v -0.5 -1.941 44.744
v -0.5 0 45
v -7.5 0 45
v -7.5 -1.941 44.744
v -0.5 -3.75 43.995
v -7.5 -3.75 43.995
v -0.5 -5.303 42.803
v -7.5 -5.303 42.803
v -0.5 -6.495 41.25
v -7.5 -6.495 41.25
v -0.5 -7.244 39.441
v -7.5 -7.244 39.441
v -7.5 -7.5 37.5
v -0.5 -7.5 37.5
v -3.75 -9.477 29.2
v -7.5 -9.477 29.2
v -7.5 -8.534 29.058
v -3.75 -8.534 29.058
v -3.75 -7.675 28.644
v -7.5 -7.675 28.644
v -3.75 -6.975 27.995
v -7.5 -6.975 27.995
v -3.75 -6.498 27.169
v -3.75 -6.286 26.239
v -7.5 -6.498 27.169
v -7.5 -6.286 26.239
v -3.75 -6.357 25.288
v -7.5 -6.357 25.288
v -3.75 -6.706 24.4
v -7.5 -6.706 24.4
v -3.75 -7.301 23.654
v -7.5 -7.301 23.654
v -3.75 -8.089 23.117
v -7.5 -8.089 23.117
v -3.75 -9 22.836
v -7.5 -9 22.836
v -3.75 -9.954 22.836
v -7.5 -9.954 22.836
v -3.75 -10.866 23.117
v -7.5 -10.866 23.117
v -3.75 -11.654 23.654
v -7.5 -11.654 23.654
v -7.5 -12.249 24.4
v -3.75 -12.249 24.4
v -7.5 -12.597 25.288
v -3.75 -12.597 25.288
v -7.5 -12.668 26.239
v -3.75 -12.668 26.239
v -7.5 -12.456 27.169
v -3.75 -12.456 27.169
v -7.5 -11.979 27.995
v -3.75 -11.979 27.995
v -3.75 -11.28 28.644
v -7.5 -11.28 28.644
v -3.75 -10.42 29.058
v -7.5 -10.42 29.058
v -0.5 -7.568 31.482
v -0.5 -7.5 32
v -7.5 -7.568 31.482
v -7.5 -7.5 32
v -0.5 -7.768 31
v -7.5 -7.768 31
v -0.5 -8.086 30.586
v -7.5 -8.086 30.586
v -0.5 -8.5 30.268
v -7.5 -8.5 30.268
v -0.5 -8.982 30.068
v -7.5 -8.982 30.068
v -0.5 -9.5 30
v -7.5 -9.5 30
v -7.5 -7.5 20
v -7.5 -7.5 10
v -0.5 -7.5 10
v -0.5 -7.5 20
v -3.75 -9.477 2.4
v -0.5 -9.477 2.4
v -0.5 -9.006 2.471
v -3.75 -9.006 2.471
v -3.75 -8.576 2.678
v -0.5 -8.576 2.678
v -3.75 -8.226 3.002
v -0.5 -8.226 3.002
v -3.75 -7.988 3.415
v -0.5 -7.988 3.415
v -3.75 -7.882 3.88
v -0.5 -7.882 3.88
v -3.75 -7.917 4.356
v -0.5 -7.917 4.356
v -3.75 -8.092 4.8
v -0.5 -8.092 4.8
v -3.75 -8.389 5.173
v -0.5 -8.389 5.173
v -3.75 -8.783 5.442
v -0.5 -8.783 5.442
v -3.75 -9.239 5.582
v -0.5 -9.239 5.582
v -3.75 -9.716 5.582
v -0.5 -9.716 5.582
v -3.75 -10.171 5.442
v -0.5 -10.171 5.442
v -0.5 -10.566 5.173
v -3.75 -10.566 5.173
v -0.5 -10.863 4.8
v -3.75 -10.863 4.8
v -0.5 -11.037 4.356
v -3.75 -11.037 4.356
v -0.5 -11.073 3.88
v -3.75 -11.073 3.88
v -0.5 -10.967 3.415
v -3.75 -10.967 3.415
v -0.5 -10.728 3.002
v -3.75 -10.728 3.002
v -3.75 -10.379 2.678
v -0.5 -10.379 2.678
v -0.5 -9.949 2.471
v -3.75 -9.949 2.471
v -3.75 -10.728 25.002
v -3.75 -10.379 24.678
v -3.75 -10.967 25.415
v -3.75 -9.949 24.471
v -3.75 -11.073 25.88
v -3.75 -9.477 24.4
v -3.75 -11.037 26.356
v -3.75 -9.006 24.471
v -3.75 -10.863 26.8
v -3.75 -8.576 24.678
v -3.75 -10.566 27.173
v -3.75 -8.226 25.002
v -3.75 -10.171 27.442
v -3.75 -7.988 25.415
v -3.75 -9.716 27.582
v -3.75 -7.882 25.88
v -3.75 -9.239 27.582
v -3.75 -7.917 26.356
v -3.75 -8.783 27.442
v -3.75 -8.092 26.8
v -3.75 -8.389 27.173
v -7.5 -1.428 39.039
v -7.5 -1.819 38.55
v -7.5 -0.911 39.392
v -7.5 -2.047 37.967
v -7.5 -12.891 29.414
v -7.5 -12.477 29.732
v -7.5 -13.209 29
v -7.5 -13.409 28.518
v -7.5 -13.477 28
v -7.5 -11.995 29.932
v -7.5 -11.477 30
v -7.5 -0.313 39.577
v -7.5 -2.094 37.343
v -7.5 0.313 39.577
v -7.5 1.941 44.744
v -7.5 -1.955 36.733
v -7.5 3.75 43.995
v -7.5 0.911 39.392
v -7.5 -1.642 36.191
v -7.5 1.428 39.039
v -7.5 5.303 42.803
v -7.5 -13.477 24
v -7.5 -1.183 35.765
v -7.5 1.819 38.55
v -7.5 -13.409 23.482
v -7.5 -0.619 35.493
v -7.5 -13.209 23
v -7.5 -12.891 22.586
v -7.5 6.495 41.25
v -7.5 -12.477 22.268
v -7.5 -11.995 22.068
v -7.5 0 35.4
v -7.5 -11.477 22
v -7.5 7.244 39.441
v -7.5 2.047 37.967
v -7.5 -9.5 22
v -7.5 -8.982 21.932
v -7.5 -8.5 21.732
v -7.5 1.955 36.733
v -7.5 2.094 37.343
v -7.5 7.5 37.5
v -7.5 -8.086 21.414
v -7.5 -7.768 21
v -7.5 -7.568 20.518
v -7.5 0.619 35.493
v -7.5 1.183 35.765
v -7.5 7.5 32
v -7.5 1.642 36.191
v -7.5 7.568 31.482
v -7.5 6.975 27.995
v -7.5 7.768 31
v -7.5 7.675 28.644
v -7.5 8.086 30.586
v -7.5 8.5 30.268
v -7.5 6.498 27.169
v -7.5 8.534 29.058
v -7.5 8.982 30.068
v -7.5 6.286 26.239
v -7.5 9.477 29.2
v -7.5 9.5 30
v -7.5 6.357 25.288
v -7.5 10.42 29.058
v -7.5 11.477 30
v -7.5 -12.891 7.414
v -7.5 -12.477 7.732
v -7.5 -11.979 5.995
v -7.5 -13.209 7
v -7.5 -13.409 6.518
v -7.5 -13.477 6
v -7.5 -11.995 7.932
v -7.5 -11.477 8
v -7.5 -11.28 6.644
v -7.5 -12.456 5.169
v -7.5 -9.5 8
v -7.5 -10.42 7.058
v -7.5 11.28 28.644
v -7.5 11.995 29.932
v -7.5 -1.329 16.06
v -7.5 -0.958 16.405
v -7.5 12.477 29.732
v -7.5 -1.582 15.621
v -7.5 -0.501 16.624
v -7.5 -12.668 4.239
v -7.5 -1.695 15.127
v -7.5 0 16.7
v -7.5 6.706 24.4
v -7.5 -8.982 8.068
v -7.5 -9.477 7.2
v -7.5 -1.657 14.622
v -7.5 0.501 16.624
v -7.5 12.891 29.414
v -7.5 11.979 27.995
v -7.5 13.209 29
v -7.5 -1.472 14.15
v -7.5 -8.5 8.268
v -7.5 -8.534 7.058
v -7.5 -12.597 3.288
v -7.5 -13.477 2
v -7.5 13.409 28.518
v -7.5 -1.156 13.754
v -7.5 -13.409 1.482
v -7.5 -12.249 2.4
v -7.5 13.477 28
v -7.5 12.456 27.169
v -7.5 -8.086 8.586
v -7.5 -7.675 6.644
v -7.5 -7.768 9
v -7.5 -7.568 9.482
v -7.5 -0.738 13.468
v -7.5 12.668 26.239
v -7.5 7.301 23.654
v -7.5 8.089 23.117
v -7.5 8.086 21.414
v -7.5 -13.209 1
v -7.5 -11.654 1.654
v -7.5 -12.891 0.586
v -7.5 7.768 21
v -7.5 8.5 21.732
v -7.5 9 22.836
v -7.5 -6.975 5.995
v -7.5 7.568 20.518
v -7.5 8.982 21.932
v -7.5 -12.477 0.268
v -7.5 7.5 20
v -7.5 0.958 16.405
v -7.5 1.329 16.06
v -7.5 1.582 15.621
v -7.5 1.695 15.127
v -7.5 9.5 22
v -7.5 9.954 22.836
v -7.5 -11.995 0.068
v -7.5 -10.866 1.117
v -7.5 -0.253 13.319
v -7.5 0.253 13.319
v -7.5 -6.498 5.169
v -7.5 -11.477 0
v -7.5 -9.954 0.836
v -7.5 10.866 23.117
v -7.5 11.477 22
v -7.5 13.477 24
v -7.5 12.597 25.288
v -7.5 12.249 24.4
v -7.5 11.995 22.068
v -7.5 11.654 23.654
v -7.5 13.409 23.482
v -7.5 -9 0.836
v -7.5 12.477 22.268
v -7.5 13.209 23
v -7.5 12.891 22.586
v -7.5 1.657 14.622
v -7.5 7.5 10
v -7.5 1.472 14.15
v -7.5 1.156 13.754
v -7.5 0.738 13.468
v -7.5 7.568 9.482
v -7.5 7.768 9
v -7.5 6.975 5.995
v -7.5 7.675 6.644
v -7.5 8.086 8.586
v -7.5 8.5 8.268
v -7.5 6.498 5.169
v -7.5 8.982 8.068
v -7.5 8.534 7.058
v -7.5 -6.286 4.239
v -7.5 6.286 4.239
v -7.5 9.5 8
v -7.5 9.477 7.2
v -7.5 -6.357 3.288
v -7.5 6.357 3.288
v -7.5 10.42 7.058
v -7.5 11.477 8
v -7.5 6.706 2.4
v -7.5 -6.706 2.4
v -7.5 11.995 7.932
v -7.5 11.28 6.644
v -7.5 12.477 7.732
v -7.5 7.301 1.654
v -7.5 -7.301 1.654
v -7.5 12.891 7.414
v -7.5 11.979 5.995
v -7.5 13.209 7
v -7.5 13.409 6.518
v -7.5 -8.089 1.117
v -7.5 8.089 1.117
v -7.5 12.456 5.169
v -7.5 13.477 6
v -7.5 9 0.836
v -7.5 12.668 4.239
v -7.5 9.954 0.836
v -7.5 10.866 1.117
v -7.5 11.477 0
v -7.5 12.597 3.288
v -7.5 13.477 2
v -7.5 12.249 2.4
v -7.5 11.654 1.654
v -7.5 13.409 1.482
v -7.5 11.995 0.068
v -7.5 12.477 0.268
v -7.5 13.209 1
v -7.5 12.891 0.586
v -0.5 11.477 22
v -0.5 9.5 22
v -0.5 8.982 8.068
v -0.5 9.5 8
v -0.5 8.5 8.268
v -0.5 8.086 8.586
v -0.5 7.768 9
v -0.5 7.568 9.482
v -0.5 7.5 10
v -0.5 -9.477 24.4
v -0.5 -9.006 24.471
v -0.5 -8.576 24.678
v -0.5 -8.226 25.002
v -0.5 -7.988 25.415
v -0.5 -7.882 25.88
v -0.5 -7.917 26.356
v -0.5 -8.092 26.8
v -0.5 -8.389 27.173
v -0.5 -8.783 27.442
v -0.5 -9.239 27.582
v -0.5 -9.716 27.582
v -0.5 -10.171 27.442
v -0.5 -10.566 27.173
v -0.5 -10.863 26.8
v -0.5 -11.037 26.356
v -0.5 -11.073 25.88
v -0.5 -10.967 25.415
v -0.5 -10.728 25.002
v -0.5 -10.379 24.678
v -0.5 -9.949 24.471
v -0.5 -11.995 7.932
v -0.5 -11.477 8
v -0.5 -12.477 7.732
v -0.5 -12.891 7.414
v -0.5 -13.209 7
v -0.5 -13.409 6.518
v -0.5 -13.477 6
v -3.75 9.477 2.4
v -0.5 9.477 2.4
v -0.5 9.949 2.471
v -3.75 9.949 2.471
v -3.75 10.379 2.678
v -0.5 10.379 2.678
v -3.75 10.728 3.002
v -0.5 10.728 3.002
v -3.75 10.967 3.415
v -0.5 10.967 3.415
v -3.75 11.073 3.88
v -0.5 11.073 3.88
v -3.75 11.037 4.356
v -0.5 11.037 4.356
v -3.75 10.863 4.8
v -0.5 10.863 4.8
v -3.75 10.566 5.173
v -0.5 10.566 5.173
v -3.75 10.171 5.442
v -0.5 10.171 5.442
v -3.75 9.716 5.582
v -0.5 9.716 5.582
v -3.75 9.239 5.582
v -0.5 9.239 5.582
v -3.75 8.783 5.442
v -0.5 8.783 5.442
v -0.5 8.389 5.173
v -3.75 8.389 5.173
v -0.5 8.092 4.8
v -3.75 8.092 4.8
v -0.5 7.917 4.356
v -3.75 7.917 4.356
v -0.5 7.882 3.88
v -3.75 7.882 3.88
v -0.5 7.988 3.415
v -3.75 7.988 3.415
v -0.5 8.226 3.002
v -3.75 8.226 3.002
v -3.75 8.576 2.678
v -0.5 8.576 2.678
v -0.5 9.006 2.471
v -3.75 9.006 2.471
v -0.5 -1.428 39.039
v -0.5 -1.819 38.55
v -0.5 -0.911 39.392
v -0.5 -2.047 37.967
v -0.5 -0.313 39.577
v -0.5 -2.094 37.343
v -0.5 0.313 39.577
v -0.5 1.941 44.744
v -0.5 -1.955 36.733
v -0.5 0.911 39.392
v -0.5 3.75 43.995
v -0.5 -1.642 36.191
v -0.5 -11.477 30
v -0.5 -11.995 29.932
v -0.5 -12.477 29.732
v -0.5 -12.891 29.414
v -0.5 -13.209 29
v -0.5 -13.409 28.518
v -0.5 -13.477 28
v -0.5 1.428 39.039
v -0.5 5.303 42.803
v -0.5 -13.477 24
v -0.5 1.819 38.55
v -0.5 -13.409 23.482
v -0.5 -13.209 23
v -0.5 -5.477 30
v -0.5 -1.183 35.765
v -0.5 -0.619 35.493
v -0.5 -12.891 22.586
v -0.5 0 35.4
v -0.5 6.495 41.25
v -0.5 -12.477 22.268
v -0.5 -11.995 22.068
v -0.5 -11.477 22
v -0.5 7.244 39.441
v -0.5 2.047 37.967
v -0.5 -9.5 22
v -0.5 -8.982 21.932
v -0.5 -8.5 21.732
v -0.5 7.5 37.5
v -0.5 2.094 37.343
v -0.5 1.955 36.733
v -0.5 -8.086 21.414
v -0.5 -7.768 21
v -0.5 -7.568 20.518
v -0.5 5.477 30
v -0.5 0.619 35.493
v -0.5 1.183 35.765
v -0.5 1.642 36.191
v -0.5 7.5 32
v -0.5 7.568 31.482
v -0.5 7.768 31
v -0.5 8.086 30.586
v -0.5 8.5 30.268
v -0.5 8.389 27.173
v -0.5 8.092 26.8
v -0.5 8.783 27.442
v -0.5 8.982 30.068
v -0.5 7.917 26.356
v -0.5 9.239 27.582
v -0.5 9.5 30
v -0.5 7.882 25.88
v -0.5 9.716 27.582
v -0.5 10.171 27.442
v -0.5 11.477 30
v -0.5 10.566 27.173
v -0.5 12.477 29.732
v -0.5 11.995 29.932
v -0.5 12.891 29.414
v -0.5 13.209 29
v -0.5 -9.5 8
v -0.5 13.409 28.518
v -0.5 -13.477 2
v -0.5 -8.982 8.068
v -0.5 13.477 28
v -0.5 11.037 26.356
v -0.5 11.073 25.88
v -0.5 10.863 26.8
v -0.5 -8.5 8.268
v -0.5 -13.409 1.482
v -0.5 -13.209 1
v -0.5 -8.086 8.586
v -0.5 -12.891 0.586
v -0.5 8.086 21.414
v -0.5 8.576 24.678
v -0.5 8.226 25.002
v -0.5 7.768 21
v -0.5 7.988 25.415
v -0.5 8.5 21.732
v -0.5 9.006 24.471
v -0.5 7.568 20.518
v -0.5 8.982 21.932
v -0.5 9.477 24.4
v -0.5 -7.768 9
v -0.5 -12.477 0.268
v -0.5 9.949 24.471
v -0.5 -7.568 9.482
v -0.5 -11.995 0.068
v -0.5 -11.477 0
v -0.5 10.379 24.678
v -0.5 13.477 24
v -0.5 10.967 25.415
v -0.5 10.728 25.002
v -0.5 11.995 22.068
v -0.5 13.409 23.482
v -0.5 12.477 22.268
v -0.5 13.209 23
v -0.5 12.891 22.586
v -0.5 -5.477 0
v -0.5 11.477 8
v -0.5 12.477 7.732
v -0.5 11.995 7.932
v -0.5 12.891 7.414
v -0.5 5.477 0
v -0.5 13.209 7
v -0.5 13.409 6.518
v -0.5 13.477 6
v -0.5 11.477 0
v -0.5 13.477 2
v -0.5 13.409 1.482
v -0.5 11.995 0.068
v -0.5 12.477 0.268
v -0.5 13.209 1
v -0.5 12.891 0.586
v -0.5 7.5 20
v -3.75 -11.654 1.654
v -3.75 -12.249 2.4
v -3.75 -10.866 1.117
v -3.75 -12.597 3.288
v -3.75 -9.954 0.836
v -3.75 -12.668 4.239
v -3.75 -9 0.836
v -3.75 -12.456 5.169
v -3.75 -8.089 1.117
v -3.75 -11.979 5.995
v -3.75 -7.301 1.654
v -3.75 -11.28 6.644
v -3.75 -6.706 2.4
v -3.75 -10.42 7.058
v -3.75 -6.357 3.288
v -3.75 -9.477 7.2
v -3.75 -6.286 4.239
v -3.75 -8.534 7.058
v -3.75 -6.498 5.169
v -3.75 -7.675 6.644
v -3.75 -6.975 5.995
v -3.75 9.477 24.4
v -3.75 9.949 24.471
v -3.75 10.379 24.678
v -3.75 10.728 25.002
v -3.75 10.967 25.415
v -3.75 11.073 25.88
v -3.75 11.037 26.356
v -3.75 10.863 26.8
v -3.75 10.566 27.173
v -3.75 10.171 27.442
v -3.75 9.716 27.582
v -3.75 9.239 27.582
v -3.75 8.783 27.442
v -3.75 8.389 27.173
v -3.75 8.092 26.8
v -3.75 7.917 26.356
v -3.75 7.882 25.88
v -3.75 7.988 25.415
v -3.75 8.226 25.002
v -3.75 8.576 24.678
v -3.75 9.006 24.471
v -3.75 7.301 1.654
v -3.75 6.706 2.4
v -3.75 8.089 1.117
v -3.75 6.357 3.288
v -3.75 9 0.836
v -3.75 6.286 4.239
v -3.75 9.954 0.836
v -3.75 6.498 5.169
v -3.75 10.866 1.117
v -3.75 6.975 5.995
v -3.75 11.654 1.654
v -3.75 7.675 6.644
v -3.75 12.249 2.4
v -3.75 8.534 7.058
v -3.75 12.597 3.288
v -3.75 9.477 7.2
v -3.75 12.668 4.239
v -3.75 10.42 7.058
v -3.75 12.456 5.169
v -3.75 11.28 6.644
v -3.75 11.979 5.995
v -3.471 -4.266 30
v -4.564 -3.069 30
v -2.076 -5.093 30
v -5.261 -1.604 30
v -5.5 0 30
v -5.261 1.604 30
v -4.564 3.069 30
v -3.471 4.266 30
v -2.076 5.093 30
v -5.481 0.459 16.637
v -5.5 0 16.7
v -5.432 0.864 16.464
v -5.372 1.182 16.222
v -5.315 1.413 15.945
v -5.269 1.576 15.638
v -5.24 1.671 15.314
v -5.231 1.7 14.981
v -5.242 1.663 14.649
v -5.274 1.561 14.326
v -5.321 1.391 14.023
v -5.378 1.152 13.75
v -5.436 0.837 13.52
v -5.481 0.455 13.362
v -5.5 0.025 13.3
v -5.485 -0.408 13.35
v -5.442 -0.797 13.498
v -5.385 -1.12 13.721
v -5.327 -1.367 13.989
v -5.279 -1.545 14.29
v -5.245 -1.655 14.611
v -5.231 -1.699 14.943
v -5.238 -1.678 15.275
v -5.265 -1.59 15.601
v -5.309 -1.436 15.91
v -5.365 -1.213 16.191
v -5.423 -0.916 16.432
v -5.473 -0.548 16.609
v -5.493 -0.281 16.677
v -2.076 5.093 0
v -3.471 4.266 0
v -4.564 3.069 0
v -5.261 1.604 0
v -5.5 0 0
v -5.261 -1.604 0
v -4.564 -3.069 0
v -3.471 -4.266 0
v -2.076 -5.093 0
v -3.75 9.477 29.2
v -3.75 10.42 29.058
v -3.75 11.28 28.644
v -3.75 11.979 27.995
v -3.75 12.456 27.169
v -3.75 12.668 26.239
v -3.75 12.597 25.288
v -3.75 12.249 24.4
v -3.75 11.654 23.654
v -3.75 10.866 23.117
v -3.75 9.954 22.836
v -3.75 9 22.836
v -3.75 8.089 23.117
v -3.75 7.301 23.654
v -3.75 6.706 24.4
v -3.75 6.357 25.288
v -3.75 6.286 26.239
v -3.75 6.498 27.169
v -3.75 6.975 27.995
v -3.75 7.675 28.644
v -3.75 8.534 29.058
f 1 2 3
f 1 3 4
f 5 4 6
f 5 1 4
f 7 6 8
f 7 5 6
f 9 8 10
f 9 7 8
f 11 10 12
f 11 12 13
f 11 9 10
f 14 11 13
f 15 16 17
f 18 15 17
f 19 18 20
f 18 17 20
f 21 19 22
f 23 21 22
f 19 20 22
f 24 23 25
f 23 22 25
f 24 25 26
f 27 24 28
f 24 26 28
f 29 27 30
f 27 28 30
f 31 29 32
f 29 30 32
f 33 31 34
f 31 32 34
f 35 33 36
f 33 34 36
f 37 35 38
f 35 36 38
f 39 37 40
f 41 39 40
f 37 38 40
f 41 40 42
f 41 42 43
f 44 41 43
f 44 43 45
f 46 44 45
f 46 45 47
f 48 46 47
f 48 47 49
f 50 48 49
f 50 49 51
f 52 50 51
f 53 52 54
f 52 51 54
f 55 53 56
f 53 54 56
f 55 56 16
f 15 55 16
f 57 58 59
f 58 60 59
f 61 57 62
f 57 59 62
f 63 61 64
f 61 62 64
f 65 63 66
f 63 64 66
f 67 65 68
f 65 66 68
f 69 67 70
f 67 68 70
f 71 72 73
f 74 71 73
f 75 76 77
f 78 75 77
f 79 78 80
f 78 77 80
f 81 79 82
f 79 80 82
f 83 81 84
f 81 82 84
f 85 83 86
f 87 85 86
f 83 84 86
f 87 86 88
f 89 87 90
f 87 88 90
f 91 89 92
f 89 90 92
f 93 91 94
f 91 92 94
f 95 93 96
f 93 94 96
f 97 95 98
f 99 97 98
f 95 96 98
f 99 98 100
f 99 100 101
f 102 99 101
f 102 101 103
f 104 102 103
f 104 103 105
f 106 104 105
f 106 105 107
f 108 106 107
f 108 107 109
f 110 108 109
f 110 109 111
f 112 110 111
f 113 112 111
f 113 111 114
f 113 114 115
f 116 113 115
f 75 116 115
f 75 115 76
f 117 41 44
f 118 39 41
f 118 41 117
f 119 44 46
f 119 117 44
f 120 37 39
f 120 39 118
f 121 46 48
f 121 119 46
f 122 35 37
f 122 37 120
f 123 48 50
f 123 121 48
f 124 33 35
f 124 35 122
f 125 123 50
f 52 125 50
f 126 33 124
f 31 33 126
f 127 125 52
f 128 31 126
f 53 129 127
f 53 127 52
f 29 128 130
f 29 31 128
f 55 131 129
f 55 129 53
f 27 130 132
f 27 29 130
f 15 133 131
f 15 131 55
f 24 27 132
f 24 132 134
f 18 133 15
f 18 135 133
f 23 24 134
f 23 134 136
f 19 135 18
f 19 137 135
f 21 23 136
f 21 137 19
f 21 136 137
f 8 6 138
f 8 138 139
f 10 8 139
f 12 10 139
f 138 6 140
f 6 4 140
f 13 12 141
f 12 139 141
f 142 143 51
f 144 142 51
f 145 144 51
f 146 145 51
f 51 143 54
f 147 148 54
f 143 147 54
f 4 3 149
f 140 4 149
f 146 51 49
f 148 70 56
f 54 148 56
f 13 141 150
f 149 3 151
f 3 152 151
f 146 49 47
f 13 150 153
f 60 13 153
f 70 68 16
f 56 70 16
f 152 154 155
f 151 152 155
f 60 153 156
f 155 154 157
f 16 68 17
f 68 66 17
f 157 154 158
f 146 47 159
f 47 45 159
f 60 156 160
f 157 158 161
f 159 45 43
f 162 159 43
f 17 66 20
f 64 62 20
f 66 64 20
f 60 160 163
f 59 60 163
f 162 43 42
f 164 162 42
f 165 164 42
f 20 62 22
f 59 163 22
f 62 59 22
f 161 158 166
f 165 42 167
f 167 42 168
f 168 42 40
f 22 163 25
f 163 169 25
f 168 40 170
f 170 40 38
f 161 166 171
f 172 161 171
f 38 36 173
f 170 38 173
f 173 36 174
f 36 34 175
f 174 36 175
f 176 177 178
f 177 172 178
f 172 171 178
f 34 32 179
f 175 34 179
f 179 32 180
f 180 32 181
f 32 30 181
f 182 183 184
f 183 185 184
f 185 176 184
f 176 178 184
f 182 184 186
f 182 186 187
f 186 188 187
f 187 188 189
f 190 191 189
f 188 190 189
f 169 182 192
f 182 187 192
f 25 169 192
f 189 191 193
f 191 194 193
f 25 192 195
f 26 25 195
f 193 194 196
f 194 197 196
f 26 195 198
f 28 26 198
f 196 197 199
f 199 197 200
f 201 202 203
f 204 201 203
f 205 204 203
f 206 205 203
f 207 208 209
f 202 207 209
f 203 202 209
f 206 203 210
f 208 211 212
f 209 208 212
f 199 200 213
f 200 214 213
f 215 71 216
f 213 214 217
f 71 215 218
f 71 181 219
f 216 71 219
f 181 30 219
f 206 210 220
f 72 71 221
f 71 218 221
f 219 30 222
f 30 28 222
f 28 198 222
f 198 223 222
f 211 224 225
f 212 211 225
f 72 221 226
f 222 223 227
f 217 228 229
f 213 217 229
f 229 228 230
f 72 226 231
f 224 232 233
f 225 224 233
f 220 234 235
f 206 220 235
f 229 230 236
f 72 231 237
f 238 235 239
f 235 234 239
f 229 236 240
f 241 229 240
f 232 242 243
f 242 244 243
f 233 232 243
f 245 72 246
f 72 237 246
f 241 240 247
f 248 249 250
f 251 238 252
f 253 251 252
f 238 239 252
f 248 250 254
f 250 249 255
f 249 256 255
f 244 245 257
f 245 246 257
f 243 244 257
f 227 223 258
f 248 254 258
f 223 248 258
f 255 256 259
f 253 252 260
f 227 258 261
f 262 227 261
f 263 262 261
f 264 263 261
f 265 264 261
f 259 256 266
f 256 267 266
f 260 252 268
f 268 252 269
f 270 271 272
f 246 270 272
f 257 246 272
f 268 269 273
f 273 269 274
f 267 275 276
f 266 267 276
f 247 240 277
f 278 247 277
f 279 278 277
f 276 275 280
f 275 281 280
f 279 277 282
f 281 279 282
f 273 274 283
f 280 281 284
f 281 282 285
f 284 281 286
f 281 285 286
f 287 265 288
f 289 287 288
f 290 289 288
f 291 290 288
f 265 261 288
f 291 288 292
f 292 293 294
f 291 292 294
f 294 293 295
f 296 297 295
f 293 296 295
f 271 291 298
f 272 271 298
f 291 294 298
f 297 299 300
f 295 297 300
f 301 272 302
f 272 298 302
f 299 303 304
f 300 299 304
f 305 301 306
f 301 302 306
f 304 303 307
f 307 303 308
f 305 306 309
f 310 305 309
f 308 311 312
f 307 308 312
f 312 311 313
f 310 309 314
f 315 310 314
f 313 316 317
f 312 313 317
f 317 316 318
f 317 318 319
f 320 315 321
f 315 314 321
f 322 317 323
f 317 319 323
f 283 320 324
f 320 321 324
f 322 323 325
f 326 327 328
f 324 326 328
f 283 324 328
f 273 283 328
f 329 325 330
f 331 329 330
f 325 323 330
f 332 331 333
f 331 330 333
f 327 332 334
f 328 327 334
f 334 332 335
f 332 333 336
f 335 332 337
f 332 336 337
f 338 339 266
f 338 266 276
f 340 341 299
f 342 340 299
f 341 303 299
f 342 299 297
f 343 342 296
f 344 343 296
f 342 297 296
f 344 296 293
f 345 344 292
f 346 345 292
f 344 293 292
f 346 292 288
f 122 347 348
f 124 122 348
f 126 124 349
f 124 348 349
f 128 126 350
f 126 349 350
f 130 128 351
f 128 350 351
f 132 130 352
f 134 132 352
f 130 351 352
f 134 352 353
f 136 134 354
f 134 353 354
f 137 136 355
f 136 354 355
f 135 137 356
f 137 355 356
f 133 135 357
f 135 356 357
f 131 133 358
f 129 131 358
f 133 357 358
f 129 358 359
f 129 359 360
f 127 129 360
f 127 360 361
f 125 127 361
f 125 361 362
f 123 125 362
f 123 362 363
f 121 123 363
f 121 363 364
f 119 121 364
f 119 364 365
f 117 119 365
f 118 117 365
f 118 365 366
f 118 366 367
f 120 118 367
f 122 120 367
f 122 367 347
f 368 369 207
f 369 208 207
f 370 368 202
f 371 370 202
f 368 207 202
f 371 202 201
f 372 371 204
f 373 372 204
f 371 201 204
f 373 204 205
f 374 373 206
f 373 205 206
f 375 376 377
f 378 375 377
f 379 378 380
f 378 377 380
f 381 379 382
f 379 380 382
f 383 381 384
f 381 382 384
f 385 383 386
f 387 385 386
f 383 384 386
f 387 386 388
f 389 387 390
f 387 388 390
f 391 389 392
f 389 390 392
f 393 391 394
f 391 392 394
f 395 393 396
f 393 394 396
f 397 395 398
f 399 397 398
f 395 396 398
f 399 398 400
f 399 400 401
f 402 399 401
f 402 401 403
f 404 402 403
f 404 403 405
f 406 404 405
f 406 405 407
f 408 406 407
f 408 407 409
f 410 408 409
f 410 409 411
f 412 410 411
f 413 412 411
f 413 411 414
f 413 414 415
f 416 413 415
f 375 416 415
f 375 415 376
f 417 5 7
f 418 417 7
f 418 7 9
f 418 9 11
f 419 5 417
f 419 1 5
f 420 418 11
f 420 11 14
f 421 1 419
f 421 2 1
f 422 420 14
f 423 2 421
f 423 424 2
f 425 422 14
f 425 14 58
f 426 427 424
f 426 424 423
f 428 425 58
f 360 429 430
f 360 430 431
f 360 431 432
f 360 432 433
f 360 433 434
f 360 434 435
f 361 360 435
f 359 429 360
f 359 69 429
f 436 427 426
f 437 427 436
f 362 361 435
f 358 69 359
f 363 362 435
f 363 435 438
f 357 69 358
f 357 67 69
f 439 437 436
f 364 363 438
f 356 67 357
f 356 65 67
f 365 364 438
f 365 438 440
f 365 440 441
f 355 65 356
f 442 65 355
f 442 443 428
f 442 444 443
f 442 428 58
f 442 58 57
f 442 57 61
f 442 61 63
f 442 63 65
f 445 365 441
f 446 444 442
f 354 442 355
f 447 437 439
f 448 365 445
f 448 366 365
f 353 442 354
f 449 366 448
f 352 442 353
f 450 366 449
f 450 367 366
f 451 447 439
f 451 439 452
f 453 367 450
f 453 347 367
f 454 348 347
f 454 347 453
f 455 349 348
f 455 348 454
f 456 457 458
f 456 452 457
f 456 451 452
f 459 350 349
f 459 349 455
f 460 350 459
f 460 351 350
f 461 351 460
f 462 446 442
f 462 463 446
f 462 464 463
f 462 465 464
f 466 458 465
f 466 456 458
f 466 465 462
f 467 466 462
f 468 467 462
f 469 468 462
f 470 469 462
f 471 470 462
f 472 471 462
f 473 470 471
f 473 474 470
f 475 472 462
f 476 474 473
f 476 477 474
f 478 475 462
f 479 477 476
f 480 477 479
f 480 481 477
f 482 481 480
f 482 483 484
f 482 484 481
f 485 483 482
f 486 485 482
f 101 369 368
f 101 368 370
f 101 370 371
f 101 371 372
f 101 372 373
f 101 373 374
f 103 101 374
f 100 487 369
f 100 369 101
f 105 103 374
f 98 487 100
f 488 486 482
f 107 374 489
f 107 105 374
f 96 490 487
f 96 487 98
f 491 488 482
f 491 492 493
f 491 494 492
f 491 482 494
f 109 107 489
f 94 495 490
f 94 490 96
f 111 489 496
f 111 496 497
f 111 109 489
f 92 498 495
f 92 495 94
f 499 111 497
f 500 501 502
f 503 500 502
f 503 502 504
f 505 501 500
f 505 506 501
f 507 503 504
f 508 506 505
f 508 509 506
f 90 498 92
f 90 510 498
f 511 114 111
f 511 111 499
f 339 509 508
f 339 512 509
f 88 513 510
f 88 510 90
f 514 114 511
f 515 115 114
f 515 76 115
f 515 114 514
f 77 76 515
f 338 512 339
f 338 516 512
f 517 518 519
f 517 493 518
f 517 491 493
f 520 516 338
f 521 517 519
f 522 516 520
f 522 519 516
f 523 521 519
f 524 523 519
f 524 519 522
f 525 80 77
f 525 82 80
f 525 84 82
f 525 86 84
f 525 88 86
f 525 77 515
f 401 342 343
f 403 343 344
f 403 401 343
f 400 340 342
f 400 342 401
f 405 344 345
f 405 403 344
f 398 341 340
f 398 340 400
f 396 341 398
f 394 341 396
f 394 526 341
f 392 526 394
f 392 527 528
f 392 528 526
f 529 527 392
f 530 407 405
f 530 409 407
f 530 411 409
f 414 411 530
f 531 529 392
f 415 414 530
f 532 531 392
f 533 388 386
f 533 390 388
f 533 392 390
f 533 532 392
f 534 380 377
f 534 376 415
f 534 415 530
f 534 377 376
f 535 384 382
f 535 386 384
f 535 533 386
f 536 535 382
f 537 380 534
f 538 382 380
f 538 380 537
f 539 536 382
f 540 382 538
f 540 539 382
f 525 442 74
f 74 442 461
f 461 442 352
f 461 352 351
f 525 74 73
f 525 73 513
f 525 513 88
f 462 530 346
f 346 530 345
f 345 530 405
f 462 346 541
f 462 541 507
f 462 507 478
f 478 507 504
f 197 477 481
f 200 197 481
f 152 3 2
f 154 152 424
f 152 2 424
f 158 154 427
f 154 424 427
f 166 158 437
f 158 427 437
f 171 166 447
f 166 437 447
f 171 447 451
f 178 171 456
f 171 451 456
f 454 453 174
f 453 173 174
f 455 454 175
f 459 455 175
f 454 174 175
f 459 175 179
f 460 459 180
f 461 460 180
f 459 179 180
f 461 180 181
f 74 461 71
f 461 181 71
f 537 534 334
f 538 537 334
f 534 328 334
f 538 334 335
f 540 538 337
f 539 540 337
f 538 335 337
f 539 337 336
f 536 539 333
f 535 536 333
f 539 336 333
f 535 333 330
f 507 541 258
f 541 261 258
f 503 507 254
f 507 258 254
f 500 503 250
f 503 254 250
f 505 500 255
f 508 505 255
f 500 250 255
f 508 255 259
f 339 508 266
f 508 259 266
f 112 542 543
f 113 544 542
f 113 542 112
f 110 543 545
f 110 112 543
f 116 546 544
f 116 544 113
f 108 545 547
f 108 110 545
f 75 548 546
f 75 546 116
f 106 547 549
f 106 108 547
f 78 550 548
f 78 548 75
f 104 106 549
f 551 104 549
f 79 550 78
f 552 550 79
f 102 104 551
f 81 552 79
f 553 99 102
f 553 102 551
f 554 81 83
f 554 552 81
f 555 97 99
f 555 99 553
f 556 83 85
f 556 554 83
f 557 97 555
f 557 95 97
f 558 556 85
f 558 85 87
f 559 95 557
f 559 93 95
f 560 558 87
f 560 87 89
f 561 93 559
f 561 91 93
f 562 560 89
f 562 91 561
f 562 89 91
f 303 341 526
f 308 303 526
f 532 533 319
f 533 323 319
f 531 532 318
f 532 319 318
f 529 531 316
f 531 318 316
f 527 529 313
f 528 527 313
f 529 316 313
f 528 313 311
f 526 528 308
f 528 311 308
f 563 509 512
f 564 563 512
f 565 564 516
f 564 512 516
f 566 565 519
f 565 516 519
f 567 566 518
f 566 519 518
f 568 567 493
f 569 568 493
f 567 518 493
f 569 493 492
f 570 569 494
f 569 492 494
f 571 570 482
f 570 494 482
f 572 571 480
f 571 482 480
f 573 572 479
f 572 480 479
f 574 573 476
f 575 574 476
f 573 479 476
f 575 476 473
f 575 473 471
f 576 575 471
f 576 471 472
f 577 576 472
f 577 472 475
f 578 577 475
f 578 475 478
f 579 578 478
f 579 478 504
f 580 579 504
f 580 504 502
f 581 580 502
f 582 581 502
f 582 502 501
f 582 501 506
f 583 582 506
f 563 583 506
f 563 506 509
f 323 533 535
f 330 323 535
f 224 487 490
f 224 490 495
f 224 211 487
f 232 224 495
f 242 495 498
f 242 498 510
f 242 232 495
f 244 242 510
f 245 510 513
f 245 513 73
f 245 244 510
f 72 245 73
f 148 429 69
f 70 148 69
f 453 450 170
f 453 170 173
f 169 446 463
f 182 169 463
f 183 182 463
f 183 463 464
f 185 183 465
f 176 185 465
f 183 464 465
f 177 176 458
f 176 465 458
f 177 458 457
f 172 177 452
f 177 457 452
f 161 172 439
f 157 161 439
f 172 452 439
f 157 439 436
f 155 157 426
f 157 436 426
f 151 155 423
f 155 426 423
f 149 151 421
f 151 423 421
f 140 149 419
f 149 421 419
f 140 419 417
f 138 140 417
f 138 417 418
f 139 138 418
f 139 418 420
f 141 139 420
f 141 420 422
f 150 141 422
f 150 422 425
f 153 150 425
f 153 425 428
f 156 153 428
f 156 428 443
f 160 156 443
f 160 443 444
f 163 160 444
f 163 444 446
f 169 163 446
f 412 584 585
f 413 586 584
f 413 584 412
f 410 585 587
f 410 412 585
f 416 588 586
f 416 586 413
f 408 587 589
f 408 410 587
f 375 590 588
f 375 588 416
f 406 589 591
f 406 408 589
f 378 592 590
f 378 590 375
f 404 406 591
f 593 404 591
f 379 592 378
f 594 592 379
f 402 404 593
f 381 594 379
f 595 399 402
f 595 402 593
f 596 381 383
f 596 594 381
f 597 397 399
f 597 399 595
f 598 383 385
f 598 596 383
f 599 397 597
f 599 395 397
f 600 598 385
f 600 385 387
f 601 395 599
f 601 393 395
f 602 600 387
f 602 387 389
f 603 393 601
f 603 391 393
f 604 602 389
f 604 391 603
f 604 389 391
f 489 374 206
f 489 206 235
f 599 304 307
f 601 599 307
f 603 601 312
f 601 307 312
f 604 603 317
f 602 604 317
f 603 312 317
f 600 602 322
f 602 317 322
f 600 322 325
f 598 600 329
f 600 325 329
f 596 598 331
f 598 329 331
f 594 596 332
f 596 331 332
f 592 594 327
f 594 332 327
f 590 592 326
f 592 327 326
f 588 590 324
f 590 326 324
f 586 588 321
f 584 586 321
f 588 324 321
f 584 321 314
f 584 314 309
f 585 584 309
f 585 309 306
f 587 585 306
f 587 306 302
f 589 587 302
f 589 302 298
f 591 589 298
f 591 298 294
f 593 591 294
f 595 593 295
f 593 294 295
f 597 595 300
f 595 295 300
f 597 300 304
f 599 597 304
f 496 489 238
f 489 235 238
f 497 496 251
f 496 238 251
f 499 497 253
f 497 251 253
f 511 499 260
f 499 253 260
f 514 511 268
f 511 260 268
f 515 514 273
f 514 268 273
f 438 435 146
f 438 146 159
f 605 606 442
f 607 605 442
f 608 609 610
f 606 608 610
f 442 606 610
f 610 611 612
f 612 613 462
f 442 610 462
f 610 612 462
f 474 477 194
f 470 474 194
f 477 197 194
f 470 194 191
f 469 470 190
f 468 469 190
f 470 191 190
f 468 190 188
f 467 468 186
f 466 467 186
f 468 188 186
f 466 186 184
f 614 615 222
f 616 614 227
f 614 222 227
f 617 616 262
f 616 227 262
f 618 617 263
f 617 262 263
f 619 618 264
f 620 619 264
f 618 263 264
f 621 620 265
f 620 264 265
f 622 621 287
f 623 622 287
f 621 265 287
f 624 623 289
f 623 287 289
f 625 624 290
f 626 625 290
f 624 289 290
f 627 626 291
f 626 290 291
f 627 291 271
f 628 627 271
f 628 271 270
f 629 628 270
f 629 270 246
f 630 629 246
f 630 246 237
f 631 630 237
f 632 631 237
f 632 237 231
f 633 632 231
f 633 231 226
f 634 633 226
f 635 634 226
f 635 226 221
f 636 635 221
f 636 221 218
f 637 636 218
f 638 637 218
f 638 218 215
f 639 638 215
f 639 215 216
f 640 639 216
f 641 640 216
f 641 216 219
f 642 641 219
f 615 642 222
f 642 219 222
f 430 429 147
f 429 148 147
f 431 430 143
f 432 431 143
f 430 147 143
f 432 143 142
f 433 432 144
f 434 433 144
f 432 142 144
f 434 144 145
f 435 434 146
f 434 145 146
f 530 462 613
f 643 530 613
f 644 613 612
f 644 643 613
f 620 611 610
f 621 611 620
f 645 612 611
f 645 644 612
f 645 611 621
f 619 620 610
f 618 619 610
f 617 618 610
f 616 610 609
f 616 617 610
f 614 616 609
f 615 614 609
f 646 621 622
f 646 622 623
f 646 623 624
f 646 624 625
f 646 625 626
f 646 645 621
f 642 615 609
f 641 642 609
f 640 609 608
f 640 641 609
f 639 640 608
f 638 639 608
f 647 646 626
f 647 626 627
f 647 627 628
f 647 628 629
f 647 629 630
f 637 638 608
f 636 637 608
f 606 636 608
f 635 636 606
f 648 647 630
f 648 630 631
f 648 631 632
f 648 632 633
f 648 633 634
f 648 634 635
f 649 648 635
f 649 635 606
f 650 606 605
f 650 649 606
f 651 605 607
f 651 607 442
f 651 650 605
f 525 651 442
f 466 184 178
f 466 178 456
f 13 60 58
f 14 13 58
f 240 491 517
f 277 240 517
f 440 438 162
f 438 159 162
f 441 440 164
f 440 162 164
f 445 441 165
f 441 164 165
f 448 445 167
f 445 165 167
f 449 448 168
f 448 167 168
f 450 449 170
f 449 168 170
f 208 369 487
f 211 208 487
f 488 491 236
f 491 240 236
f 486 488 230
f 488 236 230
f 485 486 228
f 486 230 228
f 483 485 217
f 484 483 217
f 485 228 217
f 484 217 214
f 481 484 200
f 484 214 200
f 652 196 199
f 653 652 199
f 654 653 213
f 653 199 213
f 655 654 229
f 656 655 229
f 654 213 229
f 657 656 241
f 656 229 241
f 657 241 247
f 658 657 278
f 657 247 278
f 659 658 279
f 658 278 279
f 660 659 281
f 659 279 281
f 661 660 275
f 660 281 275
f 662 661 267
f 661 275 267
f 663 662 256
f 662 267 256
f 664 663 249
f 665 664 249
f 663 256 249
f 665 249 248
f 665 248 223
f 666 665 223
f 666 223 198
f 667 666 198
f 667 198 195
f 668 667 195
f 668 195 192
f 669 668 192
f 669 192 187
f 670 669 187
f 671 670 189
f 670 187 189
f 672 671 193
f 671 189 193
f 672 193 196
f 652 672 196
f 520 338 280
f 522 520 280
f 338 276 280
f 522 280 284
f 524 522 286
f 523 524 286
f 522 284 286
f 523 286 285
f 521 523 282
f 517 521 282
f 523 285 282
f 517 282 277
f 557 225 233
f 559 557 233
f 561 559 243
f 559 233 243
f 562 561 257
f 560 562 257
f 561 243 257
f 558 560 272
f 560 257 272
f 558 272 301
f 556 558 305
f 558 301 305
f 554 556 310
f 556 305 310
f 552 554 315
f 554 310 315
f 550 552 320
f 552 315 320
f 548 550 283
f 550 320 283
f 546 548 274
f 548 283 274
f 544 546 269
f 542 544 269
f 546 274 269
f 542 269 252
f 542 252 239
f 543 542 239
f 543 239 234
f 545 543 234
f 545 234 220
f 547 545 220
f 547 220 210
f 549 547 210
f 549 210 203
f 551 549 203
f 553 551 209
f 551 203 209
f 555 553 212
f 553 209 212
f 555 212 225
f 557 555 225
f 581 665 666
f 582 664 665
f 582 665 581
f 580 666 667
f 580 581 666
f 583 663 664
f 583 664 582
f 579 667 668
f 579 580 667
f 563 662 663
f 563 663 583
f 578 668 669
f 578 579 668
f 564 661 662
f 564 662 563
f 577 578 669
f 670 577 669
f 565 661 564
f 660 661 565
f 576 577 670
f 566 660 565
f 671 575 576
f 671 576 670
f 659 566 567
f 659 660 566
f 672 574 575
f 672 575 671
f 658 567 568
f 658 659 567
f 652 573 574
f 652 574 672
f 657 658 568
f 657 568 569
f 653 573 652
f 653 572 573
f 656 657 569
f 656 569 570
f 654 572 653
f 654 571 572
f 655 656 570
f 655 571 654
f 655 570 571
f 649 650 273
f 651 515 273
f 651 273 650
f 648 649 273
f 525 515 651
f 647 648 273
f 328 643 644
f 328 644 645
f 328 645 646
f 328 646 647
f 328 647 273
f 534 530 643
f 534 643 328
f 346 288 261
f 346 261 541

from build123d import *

# Parameters (mm, degrees)
SKETCH_1_W          = 15
SKETCH_1_H          = 15
SKETCH_1_R          = 5.5
EXTRUDE_1_DEPTH     = 45
SKETCH_5_W          = 15
SKETCH_5_H          = 15
EXTRUDE_3_DEPTH     = 15
FILLET_2_R          = 7.5
SKETCH_6_R          = 2.1
CUT_EXTRUDE_1_DEPTH = 49.023431781
CUT_EXTRUDE_2_DEPTH = 8
SKETCH_9_W          = 8
SKETCH_9_H          = 8
SKETCH_9_R          = 1.6
EXTRUDE_4_DEPTH     = 7
FILLET_3_R          = 2
SKETCH_11_R         = 3.2
CUT_EXTRUDE_3_DEPTH = 3.75
SKETCH_12_R         = 1.7
CUT_EXTRUDE_4_DEPTH = 10


with BuildPart() as part:
    # ｽｹｯﾁ1 → ﾎﾞｽ - 押し出し1 (new body)
    with BuildSketch(Plane.XY):
        Rectangle(SKETCH_1_W, SKETCH_1_H)
        with Locations(Location((0, 0, 0), (0, 0, 180))):
            Circle(SKETCH_1_R, mode=Mode.SUBTRACT)
    extrude(amount=EXTRUDE_1_DEPTH)

    # ｽｹｯﾁ5 → ﾎﾞｽ - 押し出し3 (add)
    with BuildSketch(Plane.XY.offset(45)):
        Rectangle(SKETCH_5_W, SKETCH_5_H)
    extrude(amount=-EXTRUDE_3_DEPTH)

    # ﾌｨﾚｯﾄ2
    fillet_2_edges = [part.edges().sort_by_distance(p)[0] for p in [
        (0, -7.5, 45),
        (0, 7.5, 45),
    ]]
    fillet(fillet_2_edges, radius=FILLET_2_R - 0.0001)  # a hair under: the kernel refuses the full size

    # ｽｹｯﾁ6 → ｶｯﾄ - 押し出し1 (cut, through all)
    with BuildSketch(Plane(origin=(7.5, 0, 0), x_dir=(0, 0, -1), z_dir=(1, 0, 0))):
        with Locations((-37.5, 0)):
            Circle(SKETCH_6_R)
    extrude(amount=-CUT_EXTRUDE_1_DEPTH, mode=Mode.SUBTRACT)

    # ｽｹｯﾁ7 → ｶｯﾄ - 押し出し2 (cut)
    with BuildSketch(Plane(origin=(7.5, 0, 0), x_dir=(0, 0, -1), z_dir=(1, 0, 0))):
        with BuildLine():
            Line((-37.5, -9.5), (2, -9.5))
            Line((2, -9.5), (2, 9.5))
            Line((2, 9.5), (-37.5, 9.5))
            ThreePointArc((-37.5, 9.5), (-44.217514421, 6.717514421), (-47, 0))
            ThreePointArc((-47, 0), (-44.217514421, -6.717514421), (-37.5, -9.5))
        make_face()
    extrude(amount=-CUT_EXTRUDE_2_DEPTH, mode=Mode.SUBTRACT)

    # ｽｹｯﾁ9 → ﾎﾞｽ - 押し出し4 (add)
    # profile 1 of 4: a face of its own
    with BuildSketch(Plane(origin=(-0.5, 0, 0), x_dir=(0, 0, -1), z_dir=(1, 0, 0))):
        with Locations((-4, -9.477225575)):
            Rectangle(SKETCH_9_W, SKETCH_9_H)
        with Locations((-4, -9.477225575)):
            Circle(SKETCH_9_R, mode=Mode.SUBTRACT)
    # profile 2 of 4: a face of its own
    with BuildSketch(Plane(origin=(-0.5, 0, 0), x_dir=(0, 0, -1), z_dir=(1, 0, 0))):
        with Locations((-26, 9.477225575)):
            Rectangle(SKETCH_9_W, SKETCH_9_H)
        with Locations((-26, 9.477225575)):
            Circle(SKETCH_9_R, mode=Mode.SUBTRACT)
    # profile 3 of 4: a face of its own
    with BuildSketch(Plane(origin=(-0.5, 0, 0), x_dir=(0, 0, -1), z_dir=(1, 0, 0))):
        with Locations((-4, 9.477225575)):
            Rectangle(SKETCH_9_W, SKETCH_9_H)
        with Locations((-4, 9.477225575)):
            Circle(SKETCH_9_R, mode=Mode.SUBTRACT)
    # profile 4 of 4: a face of its own
    with BuildSketch(Plane(origin=(-0.5, 0, 0), x_dir=(0, 0, -1), z_dir=(1, 0, 0))):
        with Locations((-26, -9.477225575)):
            Rectangle(SKETCH_9_W, SKETCH_9_H)
        with Locations((-26, -9.477225575)):
            Circle(SKETCH_9_R, mode=Mode.SUBTRACT)
    extrude(amount=-EXTRUDE_4_DEPTH)

    # ﾌｨﾚｯﾄ3
    fillet_3_edges = [part.edges().sort_by_distance(p)[0] for p in [
        (-4, 13.477225575, 22),
        (-4, 7.5, 30),
        (-4, 13.477225575, 30),
        (-4, 7.5, 22),
        (-4, 13.477225575, 0),
        (-4, 7.5, 8),
        (-4, 13.477225575, 8),
        (-4, -13.477225575, 30),
        (-4, -7.5, 22),
        (-4, -13.477225575, 22),
        (-4, -7.5, 30),
        (-4, -13.477225575, 8),
        (-4, -13.477225575, 0),
        (-4, -7.5, 8),
    ]]
    fillet(fillet_3_edges, radius=FILLET_3_R)

    # ｽｹｯﾁ11 → ｶｯﾄ - 押し出し3 (cut)
    with BuildSketch(Plane.ZY.offset(7.5)):
        with Locations((4, 9.477225575)):
            Circle(SKETCH_11_R)
        with Locations((26, 9.477225575)):
            Circle(SKETCH_11_R)
        with Locations((26, -9.477225575)):
            Circle(SKETCH_11_R)
        with Locations((4, -9.477225575)):
            Circle(SKETCH_11_R)
    extrude(amount=-CUT_EXTRUDE_3_DEPTH, mode=Mode.SUBTRACT)

    # ｽｹｯﾁ12 → ｶｯﾄ - 押し出し4 (cut)
    with BuildSketch(Plane.ZY.offset(7.5)):
        with Locations((15, 0)):
            Circle(SKETCH_12_R)
    extrude(amount=-CUT_EXTRUDE_4_DEPTH, mode=Mode.SUBTRACT)


solid = part.part
